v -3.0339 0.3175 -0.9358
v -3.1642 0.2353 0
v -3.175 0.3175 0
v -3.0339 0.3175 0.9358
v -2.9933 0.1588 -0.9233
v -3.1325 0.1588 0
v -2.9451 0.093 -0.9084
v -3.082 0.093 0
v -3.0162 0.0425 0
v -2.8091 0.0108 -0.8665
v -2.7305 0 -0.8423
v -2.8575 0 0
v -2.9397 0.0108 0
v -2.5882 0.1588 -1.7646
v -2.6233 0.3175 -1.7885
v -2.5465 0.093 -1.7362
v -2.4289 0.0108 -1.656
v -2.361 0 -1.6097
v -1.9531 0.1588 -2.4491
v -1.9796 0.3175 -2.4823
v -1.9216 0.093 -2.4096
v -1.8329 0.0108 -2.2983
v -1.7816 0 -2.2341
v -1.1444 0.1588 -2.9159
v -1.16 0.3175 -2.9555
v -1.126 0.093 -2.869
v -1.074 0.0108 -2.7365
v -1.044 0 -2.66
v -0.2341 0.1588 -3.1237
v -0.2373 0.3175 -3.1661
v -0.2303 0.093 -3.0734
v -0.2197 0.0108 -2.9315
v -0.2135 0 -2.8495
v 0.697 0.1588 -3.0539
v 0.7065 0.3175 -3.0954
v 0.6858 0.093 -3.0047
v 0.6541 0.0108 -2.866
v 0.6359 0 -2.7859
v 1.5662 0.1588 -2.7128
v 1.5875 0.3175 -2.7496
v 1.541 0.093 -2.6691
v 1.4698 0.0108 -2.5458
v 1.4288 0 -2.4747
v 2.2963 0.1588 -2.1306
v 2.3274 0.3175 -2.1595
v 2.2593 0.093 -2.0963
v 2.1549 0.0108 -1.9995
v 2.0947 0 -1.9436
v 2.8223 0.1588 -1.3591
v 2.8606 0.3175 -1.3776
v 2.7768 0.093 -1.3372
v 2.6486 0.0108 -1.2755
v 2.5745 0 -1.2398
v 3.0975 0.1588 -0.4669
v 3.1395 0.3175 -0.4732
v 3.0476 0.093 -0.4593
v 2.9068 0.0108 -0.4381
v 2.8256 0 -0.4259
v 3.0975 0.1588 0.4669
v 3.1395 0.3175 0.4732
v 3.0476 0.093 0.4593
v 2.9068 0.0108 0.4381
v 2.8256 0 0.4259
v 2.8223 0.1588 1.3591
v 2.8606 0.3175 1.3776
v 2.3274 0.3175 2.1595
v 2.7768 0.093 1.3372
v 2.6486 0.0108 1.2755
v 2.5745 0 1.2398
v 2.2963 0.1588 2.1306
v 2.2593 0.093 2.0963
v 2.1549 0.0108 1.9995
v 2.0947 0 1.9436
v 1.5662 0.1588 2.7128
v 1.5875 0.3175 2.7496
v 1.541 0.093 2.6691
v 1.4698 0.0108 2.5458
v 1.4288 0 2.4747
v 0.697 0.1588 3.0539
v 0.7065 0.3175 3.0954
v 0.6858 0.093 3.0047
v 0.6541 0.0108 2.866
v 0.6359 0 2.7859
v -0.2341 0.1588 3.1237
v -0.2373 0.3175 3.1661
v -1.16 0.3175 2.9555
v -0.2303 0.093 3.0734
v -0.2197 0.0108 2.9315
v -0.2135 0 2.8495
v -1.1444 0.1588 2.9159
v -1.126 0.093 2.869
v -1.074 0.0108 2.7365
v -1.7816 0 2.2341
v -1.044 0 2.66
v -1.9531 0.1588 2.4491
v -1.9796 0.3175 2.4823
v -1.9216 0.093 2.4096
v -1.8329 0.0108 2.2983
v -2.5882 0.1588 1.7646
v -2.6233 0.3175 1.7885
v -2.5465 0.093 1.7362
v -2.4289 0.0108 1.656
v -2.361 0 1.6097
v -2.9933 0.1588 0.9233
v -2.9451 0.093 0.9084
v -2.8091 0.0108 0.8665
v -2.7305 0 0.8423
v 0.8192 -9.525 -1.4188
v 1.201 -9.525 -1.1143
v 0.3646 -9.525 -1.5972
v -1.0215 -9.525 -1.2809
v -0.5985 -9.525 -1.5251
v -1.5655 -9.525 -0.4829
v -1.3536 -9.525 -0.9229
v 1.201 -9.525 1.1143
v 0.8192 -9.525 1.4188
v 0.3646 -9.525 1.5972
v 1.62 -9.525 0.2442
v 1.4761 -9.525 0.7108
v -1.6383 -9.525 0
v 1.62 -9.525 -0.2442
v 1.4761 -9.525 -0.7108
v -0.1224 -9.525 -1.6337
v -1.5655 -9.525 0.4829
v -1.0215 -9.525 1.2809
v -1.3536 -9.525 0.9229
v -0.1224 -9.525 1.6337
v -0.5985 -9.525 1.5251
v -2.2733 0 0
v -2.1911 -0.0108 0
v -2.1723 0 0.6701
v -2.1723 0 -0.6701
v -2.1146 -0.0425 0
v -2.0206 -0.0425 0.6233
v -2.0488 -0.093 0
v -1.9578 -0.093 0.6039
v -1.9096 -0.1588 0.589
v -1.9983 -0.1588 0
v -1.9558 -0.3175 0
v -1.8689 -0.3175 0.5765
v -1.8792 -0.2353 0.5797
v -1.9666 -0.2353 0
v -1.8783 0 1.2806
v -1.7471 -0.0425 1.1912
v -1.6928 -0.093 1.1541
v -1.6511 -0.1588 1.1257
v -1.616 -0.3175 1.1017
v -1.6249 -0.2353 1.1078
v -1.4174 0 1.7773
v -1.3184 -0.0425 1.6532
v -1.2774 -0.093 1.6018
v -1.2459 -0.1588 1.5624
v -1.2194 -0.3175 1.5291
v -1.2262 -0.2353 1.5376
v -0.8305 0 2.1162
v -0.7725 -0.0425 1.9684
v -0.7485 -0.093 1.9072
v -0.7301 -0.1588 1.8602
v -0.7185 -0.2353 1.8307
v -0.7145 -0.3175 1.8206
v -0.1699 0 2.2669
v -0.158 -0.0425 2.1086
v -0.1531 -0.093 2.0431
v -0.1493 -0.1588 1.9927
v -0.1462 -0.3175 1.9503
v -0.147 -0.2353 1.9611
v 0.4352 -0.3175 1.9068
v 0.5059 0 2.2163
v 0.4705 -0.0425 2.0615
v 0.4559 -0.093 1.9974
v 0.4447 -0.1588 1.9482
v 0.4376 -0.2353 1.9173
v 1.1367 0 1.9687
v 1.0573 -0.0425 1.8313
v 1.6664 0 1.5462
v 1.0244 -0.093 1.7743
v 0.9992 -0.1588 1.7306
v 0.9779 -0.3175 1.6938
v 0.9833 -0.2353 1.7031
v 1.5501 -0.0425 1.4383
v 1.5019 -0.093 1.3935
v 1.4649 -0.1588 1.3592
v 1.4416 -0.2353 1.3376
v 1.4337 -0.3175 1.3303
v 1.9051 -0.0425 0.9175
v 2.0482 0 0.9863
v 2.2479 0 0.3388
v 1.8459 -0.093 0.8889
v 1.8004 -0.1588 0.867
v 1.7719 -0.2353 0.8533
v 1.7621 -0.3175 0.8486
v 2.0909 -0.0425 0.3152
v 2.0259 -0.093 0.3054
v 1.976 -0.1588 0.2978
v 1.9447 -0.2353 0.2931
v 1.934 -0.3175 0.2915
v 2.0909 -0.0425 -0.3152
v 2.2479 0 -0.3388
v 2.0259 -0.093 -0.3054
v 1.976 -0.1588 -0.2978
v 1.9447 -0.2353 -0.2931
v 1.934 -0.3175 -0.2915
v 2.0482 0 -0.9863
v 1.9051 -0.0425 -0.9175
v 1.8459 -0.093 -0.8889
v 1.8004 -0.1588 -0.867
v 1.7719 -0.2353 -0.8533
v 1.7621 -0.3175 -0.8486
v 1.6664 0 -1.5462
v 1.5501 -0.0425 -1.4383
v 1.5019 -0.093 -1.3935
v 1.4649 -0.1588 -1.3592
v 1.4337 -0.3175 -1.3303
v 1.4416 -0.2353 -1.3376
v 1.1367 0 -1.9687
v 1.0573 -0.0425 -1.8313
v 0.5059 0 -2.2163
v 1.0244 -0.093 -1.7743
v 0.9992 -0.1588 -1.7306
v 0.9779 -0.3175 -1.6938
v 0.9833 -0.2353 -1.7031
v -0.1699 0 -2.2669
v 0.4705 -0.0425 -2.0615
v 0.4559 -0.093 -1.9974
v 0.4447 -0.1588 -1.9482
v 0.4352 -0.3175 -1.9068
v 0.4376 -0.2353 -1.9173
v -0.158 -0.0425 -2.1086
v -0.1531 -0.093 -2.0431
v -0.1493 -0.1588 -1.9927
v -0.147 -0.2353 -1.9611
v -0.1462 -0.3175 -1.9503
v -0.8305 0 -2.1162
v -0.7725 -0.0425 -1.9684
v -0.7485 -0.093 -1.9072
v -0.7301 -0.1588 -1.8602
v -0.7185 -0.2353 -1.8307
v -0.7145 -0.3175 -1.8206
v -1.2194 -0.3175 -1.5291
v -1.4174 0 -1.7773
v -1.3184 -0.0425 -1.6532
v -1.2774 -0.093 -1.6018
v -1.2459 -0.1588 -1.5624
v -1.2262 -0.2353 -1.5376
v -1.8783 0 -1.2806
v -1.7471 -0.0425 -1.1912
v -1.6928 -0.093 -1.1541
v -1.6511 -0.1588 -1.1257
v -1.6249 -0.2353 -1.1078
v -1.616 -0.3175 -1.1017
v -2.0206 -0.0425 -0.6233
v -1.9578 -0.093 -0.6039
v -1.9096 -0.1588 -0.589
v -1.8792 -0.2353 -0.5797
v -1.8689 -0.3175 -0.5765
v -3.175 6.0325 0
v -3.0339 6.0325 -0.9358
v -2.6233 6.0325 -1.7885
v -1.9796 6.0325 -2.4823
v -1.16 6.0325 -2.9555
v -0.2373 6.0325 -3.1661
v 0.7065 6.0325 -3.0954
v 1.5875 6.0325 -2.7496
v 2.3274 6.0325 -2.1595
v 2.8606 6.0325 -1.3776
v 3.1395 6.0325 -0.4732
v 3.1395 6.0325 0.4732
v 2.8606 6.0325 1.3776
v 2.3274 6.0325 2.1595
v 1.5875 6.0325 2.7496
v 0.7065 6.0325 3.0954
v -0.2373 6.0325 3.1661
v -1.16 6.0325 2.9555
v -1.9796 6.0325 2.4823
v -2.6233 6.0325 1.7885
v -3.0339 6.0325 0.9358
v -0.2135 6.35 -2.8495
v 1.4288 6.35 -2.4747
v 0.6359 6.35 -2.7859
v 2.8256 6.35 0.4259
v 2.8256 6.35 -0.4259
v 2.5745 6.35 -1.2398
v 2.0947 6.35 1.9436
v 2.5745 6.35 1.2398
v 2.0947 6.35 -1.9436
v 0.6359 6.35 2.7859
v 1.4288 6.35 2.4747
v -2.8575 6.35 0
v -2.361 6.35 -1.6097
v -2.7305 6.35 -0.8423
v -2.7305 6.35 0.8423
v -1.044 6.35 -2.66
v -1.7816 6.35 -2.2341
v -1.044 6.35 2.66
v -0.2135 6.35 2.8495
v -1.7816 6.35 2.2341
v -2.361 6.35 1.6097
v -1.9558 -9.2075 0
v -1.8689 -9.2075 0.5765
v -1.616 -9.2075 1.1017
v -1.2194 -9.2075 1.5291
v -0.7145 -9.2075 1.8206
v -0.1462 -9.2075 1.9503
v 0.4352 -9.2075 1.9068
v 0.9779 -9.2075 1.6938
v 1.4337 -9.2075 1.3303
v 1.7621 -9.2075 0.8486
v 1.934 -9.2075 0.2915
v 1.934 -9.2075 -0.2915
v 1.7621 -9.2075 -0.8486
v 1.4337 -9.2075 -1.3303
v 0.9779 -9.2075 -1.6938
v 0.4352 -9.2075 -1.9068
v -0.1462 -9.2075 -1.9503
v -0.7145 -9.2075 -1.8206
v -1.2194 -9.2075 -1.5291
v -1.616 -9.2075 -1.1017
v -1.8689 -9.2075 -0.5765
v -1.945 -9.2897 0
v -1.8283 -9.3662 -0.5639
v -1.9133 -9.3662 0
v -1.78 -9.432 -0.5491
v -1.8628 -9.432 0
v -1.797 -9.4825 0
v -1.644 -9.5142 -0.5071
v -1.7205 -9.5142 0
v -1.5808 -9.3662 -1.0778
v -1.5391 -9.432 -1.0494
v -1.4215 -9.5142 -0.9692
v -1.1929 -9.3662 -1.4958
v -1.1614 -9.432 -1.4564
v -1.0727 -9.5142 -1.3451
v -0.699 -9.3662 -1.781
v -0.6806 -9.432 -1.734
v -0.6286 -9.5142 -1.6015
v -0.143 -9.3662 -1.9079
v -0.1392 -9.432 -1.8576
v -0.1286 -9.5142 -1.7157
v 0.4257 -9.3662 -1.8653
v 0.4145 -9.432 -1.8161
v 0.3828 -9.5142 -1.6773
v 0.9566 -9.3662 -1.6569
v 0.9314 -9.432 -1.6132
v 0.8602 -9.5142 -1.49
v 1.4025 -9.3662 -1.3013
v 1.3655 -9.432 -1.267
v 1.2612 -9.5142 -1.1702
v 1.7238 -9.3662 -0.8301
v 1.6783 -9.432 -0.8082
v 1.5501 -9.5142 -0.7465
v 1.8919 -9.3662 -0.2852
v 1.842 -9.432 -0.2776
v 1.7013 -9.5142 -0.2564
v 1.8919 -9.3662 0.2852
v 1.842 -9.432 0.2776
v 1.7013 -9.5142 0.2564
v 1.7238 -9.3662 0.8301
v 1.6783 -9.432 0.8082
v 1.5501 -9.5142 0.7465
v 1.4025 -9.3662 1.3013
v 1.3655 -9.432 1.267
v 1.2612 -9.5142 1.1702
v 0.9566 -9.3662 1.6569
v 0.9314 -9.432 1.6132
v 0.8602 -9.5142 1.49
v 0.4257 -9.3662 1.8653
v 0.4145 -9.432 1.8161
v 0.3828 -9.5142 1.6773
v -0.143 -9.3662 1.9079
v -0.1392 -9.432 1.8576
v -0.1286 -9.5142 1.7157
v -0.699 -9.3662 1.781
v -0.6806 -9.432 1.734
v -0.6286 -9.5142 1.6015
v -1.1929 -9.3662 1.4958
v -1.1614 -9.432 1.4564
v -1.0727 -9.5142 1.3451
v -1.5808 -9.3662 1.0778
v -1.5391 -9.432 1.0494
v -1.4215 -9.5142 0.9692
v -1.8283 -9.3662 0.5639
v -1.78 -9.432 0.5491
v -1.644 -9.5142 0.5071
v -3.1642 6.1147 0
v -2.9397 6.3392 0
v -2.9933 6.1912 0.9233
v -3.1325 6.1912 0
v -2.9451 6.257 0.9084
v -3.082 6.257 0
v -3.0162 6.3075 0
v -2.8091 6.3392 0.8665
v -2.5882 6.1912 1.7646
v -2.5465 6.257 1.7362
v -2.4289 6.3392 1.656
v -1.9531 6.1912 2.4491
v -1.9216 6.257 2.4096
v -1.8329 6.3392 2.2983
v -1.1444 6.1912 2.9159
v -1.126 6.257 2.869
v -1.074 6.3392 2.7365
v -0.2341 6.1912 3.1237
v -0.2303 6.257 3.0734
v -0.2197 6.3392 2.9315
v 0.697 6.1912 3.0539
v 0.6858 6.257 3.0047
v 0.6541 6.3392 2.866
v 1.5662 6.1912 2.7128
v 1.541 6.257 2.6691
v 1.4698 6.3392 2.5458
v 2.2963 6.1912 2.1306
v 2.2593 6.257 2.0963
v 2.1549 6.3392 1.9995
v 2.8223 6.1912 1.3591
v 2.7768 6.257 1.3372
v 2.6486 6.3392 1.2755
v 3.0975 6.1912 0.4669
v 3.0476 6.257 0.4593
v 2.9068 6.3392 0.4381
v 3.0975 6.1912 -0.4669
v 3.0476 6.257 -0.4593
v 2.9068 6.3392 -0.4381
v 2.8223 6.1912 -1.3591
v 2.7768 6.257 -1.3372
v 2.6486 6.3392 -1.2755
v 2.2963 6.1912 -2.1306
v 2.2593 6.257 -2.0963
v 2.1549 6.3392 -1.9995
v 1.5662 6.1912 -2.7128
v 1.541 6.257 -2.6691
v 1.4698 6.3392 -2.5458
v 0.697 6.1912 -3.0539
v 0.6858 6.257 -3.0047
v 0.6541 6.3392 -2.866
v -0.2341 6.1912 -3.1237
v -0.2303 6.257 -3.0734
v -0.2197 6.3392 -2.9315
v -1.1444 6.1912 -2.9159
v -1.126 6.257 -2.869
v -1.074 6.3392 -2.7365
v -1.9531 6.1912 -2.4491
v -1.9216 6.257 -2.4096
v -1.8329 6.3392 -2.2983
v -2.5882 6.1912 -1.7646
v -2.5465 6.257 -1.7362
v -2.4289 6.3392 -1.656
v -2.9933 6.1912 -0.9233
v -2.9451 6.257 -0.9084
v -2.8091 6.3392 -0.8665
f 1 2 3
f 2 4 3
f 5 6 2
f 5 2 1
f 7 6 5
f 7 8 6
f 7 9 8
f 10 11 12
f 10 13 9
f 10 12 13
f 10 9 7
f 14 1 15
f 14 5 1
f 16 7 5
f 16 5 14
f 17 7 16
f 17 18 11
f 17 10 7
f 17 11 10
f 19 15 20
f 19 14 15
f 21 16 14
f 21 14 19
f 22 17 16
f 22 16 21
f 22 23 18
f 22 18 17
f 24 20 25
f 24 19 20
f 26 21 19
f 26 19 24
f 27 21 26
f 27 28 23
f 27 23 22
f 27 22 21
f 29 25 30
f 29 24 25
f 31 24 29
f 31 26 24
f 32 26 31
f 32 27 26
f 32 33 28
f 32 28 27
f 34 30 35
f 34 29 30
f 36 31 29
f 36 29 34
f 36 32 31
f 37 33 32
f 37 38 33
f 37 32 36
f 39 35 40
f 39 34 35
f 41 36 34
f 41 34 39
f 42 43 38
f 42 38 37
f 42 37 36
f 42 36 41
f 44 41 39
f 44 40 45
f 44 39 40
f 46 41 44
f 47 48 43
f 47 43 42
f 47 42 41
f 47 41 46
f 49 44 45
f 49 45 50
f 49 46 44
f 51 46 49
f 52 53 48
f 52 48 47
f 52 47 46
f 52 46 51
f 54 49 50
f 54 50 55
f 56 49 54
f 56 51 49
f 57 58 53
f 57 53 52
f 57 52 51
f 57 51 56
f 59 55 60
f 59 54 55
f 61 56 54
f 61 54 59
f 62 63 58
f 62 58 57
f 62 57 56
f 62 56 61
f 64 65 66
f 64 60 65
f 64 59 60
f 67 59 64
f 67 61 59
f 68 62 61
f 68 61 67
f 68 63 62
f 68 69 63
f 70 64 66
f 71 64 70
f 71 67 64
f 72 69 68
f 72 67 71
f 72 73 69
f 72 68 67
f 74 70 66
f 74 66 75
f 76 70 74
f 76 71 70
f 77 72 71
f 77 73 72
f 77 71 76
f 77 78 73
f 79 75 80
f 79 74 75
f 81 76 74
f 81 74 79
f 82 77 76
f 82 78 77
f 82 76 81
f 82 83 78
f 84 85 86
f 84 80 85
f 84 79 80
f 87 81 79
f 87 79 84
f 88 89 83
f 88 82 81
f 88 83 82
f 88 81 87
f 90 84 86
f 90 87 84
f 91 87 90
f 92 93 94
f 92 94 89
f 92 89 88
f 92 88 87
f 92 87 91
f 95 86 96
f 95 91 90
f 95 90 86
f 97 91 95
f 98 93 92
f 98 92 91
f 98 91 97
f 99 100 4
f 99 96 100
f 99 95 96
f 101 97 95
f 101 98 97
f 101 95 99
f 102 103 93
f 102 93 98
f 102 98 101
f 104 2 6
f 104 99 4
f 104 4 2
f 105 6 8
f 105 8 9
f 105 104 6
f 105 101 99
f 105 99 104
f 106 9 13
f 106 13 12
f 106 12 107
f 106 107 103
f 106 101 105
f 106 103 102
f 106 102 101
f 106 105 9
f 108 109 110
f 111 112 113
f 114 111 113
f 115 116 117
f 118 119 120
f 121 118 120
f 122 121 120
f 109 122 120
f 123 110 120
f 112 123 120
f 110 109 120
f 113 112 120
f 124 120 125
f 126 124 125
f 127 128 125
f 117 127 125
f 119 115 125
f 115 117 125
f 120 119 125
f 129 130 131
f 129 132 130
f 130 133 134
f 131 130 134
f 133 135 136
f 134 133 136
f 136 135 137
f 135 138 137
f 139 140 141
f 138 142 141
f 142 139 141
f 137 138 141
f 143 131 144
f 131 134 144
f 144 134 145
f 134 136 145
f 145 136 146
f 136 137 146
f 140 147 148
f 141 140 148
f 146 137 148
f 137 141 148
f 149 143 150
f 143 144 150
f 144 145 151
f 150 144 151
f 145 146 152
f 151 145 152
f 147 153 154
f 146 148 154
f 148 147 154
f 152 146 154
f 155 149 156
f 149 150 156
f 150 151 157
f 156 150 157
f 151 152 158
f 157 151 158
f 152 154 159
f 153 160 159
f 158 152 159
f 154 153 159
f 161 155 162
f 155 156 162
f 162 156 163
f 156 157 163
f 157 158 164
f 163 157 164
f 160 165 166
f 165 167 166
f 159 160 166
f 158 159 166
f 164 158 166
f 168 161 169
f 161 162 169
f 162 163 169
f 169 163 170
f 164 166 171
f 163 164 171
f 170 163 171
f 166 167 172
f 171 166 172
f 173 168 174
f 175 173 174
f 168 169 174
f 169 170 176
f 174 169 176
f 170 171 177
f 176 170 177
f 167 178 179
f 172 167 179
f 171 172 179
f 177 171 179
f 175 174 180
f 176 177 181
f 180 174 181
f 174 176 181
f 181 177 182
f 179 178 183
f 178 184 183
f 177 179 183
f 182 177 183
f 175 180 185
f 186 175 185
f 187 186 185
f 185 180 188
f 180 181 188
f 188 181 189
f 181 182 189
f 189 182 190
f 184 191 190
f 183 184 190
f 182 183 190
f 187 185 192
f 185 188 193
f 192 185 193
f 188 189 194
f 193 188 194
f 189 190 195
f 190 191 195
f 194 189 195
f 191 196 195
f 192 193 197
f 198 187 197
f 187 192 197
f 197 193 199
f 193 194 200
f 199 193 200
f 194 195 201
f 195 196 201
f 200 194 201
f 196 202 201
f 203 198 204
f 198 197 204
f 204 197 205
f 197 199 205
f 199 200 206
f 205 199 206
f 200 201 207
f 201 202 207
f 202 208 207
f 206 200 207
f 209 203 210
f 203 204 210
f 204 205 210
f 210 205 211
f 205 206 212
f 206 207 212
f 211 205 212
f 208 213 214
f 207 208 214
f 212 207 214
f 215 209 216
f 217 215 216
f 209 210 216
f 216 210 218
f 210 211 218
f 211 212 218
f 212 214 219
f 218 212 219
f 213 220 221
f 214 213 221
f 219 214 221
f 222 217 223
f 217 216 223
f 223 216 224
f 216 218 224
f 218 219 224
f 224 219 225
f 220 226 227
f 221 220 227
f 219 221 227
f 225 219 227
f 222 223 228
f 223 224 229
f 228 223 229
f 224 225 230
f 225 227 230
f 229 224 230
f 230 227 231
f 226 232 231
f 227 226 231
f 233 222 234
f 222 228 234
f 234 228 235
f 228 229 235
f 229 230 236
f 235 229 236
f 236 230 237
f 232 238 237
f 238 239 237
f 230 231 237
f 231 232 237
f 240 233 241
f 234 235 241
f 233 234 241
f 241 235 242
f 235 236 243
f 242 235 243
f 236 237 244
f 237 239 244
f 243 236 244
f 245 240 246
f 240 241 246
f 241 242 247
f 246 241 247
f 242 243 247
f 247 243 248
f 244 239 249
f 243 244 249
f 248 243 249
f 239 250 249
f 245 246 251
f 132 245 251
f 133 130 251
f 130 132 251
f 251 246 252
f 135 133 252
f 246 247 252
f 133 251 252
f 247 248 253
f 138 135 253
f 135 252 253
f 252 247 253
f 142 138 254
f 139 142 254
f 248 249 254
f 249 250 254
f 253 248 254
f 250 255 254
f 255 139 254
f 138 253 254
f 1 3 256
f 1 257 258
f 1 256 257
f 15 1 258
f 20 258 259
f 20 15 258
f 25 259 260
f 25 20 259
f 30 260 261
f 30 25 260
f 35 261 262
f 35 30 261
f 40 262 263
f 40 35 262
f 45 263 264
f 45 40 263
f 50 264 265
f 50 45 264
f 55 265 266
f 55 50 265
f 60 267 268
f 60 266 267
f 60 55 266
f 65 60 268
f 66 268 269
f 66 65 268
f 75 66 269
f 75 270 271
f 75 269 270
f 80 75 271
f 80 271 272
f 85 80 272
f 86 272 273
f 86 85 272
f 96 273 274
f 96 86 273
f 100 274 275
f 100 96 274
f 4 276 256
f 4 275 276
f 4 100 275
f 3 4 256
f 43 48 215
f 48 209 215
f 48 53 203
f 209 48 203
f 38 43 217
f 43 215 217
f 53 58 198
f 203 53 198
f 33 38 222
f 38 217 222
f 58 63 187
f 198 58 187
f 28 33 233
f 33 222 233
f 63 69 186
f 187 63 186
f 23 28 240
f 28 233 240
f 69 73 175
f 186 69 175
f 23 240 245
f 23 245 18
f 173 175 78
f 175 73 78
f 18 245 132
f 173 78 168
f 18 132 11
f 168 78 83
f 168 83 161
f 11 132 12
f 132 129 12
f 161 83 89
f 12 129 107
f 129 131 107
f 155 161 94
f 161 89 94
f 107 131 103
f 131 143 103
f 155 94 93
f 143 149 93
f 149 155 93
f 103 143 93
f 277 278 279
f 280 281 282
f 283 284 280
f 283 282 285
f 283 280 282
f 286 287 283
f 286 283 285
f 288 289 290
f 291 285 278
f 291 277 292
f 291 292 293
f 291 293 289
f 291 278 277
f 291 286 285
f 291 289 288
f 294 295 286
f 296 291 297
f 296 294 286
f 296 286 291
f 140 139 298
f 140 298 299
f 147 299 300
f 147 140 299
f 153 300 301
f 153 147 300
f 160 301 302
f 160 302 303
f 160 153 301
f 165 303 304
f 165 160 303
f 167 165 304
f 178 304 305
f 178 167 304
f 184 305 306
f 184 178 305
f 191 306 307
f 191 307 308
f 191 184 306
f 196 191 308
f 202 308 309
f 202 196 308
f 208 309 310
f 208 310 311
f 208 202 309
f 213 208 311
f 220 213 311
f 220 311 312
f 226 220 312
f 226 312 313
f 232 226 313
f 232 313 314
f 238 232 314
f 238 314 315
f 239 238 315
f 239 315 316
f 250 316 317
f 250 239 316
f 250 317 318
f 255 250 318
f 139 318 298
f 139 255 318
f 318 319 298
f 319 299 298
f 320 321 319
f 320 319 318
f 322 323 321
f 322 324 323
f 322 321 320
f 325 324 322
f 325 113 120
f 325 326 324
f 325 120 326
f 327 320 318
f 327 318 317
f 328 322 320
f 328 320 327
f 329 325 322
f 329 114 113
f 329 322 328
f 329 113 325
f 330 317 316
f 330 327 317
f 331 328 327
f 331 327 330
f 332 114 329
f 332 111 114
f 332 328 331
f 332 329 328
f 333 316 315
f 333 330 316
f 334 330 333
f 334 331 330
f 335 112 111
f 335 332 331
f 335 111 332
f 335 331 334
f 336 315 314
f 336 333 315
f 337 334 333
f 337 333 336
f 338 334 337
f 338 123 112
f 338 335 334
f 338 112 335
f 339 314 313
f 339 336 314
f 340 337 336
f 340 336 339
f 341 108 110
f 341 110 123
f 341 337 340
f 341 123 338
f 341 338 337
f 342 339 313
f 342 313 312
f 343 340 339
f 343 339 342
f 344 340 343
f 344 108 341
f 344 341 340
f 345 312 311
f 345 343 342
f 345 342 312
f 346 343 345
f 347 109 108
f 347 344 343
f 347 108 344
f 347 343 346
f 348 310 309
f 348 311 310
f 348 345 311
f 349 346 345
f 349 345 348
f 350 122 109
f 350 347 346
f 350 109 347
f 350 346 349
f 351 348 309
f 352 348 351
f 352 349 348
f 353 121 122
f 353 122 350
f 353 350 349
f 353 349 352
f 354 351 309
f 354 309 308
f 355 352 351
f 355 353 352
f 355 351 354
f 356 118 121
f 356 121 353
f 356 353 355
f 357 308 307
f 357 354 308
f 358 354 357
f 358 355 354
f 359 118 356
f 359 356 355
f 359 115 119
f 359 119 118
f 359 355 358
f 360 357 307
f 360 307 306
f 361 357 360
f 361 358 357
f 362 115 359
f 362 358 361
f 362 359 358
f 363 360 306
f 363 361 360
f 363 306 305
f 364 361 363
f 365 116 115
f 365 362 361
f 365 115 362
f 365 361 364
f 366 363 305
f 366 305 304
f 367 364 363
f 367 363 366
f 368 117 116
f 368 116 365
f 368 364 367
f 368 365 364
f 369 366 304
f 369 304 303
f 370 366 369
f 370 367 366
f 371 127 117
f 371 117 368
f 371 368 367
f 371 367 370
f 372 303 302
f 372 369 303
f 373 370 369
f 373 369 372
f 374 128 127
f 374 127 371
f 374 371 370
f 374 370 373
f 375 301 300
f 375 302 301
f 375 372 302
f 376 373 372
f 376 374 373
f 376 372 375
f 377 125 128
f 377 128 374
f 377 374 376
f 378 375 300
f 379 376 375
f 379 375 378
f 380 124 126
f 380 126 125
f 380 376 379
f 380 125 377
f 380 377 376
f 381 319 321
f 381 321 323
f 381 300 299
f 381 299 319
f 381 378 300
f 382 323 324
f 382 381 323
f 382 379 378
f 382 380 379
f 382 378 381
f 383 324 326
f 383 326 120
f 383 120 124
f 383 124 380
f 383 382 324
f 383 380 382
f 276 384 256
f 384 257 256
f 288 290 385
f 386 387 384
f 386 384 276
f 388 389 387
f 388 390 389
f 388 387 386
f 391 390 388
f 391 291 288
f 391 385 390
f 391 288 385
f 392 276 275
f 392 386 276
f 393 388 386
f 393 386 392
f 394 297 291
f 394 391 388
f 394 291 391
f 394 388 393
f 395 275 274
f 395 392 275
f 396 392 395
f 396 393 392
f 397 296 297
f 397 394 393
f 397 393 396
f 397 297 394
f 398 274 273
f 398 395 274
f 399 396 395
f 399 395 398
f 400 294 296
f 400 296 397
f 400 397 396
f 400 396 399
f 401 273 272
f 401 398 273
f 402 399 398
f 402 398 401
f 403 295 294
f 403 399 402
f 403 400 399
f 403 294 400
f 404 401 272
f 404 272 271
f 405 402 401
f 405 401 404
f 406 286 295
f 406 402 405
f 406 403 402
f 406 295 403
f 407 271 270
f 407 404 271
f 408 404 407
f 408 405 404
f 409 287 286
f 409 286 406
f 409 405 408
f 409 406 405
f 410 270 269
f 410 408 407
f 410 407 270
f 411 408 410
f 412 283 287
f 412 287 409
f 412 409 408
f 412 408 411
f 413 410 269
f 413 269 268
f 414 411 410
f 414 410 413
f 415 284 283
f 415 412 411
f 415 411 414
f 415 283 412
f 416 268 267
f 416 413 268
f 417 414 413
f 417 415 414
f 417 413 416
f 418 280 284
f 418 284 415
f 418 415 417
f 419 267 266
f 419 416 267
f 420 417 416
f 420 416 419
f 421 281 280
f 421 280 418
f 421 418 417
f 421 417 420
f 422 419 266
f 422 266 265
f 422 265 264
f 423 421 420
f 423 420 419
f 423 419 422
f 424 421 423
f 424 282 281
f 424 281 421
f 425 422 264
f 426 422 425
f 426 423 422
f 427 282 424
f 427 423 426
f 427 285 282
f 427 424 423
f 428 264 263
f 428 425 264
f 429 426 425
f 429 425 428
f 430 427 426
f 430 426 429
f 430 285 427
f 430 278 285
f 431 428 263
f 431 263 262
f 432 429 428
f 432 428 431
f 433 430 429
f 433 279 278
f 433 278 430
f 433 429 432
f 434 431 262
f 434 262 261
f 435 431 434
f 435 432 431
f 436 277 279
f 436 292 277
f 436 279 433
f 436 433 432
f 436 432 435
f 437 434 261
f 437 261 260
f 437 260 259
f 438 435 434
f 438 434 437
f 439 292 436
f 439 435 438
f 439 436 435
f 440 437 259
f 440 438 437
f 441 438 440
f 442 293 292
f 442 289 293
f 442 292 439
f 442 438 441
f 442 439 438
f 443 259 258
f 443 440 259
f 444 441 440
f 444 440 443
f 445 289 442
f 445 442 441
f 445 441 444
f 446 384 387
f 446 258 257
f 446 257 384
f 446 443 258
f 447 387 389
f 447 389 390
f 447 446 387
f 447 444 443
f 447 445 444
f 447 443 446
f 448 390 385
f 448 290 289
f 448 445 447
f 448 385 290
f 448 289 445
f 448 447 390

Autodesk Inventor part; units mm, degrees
ref_plane "YZ Plane" through (0, 0, 0) normal (1, 0, 0) x (0, 1, 0)
ref_plane "XZ Plane" through (0, 0, 0) normal (0, 1, 0) x (-1, 0, 0)
ref_plane "XY Plane" through (0, 0, 0) normal (0, 0, 1) x (1, 0, 0)
sketch "Sketch1" plane through (0, 0, 0) normal (0, 1, 0) x (-1, 0, 0)
  circle A0 centre (0, 0) radius 3.175
  circle A1 centre (0, 0) radius 1.9558
  dimension "d0" = 6.35
  dimension "d1" = 3.9116
extrude "Extrusion1" add sketch "Sketch1" along normal blind 6.35 contours A0 | A1
extrude "Extrusion2" add sketch "Sketch1" against normal blind 9.525 contours A1
fillet "Fillet1" radius 0.3175 4 edges at (3.175, 6.35, 0) (1.9558, -9.525, 0) (3.175, 0, 0) (1.9558, 0, 0)
properties part number "locatingpin" material "Silver"
